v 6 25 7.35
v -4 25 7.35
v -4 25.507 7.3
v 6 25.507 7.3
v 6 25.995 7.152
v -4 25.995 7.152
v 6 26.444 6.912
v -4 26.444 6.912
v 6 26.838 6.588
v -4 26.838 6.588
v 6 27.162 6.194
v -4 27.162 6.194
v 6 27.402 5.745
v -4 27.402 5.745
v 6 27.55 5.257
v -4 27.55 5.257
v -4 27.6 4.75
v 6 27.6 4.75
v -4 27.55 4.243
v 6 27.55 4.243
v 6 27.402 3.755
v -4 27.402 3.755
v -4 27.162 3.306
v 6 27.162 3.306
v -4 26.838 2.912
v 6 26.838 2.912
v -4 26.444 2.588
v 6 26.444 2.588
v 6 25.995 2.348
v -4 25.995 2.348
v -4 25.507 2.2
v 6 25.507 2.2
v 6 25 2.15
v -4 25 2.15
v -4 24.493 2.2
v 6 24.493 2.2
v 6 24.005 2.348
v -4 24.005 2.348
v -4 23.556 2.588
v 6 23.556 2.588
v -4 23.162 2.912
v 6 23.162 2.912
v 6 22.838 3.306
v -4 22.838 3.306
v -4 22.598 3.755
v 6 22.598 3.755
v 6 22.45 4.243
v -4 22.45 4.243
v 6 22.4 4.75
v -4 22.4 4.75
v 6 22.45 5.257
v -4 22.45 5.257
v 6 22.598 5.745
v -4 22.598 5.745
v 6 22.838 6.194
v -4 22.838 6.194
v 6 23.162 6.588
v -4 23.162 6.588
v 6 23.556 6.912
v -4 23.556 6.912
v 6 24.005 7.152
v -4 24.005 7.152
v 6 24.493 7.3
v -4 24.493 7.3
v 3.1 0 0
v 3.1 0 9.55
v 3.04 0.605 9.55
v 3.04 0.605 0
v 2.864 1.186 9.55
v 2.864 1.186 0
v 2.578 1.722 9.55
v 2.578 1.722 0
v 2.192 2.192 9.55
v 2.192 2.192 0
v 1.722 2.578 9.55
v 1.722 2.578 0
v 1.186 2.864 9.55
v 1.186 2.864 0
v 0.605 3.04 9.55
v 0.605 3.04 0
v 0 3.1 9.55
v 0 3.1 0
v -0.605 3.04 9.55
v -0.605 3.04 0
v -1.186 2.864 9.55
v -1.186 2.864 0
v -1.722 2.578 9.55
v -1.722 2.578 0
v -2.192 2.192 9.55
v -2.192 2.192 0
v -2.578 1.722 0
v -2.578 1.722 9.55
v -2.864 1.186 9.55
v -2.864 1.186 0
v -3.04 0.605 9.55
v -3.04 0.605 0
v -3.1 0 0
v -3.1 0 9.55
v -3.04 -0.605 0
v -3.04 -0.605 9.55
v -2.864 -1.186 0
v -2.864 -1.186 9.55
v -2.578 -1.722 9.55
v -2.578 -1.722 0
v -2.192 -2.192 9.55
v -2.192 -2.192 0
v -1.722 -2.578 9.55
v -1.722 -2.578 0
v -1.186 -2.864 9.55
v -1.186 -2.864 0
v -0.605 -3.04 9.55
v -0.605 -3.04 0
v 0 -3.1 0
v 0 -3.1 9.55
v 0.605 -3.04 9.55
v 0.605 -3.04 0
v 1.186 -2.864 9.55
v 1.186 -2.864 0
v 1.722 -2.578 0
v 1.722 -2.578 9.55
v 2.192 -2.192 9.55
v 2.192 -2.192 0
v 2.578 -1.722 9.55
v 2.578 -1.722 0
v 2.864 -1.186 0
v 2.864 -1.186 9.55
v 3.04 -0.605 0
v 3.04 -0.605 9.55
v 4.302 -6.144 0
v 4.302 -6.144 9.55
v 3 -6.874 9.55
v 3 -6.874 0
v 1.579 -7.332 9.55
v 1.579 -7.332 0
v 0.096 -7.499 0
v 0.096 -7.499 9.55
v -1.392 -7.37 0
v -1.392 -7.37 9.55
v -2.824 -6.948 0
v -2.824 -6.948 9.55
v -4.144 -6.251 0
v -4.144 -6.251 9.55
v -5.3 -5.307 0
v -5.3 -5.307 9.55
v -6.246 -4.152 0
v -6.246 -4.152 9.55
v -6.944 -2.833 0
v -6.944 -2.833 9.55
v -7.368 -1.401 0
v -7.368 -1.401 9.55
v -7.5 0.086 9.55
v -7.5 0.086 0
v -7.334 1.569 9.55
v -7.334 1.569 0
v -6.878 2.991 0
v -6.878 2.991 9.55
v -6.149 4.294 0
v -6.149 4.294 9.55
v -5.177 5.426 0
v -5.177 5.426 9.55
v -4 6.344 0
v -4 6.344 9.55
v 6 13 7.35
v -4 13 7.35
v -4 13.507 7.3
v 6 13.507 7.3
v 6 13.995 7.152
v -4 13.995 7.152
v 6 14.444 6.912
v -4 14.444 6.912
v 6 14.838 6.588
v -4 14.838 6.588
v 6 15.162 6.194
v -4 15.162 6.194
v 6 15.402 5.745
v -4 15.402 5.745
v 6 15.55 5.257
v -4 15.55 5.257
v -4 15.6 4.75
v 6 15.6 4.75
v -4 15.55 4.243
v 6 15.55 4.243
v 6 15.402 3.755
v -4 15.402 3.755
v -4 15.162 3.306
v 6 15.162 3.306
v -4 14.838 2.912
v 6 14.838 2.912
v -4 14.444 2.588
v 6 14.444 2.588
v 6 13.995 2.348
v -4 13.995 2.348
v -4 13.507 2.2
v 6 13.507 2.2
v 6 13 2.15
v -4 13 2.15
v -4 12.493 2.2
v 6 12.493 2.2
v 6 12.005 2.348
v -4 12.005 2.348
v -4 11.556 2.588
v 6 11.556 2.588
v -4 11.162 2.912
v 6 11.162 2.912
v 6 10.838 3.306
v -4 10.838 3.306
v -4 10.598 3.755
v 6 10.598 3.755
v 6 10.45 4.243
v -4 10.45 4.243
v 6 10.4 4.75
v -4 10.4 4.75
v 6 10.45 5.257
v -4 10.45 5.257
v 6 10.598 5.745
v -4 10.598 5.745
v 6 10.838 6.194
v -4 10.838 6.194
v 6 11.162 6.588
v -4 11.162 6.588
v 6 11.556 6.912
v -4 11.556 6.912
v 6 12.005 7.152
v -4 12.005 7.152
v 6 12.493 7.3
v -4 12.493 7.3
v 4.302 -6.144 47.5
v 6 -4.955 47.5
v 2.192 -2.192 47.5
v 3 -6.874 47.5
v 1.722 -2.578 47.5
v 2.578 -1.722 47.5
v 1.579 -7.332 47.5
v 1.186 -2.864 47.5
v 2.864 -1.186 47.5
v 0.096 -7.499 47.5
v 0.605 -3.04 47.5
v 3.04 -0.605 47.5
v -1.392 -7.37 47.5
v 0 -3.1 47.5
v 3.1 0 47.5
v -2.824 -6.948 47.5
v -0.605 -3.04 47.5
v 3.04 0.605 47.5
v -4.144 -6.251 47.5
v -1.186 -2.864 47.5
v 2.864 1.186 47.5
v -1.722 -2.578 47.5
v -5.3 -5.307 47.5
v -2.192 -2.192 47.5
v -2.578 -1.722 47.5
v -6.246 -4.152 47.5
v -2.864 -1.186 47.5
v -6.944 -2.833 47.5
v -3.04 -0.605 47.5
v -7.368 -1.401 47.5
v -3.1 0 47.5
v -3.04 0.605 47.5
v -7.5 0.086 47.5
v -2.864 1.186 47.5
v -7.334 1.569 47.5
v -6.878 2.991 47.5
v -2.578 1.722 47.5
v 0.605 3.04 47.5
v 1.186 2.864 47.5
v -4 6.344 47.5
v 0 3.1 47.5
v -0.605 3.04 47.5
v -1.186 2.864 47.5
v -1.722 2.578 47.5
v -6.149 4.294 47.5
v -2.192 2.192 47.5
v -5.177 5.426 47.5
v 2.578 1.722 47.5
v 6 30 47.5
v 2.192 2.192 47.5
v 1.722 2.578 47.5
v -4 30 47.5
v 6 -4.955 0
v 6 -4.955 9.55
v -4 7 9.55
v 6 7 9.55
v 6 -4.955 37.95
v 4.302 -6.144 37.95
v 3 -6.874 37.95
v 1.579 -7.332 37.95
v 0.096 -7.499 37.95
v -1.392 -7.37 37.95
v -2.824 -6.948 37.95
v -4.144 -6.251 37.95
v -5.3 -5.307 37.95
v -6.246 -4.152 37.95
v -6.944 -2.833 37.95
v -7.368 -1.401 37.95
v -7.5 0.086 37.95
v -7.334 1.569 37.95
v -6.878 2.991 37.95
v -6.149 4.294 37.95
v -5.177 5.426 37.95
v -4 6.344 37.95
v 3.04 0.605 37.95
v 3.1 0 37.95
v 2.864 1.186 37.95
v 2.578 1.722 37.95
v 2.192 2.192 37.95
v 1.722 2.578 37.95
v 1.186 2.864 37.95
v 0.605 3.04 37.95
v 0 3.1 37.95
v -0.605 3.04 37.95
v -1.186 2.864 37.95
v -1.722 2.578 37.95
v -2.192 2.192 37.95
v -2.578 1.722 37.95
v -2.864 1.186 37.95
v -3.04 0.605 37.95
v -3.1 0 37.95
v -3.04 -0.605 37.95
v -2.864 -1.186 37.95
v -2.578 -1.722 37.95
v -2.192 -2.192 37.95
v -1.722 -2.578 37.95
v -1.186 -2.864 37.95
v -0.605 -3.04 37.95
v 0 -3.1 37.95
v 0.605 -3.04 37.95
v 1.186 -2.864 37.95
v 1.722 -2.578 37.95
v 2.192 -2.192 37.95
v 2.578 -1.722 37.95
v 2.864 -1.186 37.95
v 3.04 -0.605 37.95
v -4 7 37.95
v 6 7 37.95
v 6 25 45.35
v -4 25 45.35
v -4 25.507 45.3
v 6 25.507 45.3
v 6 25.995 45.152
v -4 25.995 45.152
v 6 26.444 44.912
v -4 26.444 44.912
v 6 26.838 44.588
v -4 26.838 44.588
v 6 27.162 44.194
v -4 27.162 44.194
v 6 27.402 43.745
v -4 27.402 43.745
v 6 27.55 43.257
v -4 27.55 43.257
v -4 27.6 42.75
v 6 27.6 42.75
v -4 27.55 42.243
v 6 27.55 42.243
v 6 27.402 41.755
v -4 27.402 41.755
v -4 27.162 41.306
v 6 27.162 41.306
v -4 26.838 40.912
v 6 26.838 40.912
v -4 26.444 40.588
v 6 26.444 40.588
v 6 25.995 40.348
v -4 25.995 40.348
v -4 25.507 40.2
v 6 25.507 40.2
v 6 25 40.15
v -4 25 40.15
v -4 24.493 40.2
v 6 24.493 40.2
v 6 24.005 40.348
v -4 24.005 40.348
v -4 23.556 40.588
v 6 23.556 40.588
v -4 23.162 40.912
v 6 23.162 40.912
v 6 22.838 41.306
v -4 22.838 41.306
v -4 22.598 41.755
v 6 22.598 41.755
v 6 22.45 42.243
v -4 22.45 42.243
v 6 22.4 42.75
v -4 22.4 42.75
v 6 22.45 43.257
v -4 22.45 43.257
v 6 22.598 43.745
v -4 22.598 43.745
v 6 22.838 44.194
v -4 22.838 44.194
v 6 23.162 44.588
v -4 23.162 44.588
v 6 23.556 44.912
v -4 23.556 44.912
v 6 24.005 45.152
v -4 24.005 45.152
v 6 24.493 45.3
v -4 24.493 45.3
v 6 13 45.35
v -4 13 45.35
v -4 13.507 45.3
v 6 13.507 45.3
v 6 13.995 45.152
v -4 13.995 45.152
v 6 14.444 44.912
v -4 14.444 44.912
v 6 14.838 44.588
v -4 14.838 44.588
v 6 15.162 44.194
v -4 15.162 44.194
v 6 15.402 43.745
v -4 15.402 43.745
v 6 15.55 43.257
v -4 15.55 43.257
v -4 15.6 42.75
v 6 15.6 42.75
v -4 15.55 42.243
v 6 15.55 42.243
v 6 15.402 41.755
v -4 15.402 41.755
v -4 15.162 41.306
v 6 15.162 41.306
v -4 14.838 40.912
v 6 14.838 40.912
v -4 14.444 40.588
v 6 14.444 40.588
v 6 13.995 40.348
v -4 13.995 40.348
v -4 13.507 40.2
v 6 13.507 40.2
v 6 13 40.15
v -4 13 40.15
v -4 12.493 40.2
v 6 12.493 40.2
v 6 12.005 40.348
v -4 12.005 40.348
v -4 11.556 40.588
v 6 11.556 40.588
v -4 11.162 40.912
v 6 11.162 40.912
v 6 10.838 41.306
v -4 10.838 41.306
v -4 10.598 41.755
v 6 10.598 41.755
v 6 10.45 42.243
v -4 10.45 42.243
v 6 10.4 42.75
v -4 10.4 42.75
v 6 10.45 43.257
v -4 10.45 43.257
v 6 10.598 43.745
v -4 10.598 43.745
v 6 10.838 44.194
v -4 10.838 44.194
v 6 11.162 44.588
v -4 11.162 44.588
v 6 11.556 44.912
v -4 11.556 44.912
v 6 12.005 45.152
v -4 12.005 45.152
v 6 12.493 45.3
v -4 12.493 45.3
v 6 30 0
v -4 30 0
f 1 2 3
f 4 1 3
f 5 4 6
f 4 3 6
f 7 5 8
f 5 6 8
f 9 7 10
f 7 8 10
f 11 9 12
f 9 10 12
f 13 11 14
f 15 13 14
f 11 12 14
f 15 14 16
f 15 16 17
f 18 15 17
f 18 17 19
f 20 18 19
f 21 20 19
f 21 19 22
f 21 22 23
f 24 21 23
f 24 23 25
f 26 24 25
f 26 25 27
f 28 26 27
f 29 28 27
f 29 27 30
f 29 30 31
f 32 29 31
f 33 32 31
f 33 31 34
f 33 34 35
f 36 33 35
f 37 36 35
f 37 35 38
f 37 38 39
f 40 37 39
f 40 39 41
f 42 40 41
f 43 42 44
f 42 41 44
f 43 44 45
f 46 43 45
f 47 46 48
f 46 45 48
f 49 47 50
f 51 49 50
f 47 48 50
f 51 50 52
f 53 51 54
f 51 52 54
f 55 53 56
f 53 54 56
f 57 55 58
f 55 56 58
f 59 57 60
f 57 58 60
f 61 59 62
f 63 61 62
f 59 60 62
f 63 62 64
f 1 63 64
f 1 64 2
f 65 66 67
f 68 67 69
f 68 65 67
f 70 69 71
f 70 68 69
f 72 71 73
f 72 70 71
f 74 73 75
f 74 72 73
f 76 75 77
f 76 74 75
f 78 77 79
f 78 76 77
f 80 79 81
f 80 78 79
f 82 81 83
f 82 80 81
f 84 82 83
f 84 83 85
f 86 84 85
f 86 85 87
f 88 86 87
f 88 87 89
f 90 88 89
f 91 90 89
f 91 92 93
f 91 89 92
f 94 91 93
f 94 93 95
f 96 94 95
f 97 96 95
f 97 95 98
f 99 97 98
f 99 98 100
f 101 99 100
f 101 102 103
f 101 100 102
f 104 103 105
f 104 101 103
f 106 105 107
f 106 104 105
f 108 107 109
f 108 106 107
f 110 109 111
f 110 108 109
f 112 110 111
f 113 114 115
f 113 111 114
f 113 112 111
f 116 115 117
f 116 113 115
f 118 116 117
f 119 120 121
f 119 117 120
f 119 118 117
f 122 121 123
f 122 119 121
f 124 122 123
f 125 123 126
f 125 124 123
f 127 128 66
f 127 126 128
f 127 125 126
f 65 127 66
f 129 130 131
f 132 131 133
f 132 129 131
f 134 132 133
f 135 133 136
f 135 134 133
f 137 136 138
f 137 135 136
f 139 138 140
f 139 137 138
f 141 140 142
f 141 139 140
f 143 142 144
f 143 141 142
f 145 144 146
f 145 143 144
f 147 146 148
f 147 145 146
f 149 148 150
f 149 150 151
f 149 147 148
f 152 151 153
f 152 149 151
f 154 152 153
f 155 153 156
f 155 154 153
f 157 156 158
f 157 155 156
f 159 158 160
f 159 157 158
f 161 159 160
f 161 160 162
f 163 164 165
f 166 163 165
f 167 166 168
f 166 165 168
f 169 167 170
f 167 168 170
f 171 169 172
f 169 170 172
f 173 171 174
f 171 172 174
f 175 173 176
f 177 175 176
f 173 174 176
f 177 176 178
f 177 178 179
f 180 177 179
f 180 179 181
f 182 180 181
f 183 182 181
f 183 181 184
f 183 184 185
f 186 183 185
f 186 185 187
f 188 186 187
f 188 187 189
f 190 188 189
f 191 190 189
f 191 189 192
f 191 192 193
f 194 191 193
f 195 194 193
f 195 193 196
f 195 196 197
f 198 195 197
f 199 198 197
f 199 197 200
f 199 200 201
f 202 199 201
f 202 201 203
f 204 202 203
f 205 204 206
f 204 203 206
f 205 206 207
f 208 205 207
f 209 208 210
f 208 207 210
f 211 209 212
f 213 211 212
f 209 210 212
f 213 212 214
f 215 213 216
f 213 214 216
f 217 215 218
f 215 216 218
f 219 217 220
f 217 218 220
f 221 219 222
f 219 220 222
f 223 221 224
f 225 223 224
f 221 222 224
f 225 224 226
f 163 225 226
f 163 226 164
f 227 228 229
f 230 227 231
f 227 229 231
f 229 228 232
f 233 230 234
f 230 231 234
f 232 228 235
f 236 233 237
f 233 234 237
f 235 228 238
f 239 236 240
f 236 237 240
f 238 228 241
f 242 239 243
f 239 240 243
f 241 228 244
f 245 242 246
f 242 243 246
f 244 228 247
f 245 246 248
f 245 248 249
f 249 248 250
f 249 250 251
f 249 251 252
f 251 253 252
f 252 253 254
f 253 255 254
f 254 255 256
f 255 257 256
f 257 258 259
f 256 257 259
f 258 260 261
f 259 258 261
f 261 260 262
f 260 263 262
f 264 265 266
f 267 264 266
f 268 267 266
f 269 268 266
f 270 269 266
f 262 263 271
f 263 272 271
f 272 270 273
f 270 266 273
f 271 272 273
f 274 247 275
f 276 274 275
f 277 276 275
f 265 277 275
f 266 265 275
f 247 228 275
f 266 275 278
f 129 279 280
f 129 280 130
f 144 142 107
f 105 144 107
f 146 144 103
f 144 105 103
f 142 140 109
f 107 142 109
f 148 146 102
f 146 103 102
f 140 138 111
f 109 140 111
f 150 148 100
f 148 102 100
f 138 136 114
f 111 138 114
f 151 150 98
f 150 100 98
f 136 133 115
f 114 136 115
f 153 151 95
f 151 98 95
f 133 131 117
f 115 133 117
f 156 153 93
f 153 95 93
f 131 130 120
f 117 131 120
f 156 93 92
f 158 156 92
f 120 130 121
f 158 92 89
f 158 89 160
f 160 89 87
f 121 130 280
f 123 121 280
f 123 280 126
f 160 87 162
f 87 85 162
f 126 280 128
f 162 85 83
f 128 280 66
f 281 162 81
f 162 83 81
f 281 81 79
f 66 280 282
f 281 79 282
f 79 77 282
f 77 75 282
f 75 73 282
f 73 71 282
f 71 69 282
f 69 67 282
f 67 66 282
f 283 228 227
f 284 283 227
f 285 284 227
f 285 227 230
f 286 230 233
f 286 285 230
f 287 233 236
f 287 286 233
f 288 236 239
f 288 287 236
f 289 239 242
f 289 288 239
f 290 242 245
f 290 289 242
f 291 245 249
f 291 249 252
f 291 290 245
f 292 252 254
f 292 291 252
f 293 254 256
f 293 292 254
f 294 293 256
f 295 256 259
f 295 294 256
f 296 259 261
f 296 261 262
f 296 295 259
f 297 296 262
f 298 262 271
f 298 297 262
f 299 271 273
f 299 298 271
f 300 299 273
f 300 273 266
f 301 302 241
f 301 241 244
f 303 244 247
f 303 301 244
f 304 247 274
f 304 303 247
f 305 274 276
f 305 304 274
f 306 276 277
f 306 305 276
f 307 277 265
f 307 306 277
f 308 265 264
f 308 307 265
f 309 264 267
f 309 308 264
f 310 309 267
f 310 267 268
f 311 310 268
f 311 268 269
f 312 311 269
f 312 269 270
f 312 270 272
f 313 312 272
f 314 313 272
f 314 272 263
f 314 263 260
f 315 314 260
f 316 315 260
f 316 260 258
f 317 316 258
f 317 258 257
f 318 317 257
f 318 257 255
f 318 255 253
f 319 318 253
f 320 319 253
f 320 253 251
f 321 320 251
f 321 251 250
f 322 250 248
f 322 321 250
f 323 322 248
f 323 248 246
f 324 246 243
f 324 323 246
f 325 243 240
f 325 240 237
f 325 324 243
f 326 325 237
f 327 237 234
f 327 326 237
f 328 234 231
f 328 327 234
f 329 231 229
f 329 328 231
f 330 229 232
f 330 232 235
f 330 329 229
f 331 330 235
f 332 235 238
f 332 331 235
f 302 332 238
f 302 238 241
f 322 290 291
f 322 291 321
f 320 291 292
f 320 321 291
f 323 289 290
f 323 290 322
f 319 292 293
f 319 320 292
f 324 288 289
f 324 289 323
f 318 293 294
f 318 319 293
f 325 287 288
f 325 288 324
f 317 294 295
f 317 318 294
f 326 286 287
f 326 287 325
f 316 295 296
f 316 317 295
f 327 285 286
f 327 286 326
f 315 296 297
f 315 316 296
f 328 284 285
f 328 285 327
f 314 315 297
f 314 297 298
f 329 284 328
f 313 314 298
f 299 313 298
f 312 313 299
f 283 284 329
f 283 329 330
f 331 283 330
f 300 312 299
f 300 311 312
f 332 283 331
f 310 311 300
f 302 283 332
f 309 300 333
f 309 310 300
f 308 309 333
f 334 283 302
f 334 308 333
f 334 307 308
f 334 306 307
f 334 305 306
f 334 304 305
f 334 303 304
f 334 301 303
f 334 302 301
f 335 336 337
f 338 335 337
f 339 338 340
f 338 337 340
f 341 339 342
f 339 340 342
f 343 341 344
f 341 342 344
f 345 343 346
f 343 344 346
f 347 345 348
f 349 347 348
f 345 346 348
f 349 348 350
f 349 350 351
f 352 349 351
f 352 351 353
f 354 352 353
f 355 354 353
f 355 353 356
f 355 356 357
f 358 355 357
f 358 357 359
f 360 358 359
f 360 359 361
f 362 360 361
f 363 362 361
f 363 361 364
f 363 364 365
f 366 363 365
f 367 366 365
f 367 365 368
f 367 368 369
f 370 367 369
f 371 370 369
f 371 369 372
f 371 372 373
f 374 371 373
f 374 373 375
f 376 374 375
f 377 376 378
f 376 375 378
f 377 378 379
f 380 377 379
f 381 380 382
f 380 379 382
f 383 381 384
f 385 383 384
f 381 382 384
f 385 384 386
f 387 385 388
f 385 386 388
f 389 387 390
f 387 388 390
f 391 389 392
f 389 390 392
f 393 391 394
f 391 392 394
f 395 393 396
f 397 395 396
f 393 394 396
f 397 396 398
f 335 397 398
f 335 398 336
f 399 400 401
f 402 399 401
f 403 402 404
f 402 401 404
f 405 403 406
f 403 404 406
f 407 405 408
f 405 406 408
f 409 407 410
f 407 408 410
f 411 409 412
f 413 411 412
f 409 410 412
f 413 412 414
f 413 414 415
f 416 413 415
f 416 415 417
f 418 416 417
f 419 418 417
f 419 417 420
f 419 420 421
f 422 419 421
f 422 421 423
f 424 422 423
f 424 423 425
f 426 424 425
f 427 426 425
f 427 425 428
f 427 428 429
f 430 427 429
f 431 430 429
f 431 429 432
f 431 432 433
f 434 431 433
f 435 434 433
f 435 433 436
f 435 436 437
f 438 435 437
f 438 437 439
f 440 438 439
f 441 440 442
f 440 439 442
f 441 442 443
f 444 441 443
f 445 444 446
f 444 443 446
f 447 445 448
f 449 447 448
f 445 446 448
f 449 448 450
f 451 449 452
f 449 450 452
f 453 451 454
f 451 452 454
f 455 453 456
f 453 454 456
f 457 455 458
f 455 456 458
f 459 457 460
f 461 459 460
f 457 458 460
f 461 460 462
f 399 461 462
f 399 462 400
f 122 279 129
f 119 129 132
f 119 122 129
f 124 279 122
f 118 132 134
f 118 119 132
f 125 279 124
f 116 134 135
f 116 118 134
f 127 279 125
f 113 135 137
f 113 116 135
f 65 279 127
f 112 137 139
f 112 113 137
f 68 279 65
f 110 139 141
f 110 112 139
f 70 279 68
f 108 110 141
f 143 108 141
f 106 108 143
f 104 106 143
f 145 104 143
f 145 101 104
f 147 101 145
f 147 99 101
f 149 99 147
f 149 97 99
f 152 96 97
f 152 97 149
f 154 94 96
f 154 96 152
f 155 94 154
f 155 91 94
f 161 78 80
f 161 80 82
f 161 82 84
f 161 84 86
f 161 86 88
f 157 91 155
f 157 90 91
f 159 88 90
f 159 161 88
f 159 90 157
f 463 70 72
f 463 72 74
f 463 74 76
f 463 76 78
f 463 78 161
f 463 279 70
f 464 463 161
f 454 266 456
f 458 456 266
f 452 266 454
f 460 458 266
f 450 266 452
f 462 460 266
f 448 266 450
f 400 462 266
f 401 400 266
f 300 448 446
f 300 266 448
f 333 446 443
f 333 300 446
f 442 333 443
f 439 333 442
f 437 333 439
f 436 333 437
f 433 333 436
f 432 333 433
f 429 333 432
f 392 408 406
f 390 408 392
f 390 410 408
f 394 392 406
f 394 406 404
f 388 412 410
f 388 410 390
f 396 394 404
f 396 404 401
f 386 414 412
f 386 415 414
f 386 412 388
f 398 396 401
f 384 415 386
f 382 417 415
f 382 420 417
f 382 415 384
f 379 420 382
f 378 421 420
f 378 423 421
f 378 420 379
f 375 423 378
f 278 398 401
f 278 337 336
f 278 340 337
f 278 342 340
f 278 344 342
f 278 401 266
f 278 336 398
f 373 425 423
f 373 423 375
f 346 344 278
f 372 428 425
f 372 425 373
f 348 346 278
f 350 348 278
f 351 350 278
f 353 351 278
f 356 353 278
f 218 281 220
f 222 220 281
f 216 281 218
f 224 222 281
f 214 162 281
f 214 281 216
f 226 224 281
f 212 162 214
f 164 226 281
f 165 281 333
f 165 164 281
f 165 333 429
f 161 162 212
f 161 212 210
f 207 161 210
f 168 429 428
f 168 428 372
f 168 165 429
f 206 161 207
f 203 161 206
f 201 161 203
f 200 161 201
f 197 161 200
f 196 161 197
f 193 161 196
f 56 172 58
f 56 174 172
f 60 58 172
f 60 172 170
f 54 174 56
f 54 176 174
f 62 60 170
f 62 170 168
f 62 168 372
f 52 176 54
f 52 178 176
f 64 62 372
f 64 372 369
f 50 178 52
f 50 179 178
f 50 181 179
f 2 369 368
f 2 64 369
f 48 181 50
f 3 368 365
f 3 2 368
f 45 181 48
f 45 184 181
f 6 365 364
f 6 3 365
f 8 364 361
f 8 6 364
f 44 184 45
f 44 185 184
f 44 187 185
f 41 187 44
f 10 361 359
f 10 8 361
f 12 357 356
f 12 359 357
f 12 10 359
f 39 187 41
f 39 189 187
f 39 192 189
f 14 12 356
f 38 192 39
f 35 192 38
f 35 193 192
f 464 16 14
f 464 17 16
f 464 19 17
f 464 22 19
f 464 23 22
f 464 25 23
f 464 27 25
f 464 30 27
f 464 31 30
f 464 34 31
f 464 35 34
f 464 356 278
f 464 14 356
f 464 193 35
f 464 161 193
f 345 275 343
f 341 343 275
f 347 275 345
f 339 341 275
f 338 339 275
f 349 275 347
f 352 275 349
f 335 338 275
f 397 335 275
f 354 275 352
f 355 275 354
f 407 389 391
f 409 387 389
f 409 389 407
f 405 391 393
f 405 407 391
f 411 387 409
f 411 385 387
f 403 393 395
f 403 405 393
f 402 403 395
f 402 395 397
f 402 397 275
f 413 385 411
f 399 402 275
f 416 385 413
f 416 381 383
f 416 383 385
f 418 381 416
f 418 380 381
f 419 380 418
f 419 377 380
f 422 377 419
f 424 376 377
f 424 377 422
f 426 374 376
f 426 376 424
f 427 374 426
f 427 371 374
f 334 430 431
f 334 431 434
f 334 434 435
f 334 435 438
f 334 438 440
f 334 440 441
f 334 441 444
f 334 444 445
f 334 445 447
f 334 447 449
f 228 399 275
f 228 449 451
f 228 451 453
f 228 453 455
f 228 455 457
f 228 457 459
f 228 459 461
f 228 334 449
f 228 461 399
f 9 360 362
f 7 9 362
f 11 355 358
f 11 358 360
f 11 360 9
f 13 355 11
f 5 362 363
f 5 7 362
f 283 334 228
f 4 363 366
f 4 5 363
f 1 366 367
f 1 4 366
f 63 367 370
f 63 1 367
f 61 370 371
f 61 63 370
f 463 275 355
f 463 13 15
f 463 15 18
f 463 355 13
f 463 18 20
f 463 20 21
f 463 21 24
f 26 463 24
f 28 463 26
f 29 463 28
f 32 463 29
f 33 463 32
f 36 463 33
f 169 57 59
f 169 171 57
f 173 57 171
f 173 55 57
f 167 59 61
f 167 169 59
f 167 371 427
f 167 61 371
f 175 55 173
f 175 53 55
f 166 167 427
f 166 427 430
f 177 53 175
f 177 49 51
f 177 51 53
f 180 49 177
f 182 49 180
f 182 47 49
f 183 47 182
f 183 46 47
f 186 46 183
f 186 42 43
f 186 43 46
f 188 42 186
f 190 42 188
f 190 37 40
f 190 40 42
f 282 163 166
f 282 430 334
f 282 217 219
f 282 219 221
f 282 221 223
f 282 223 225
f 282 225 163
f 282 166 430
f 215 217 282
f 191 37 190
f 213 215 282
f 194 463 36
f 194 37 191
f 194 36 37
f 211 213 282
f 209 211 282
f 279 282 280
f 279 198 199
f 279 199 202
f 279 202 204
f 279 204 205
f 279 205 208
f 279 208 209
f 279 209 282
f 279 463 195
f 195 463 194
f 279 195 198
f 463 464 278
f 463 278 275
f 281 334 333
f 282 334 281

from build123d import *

# Parameters (mm, degrees)
SKETCH1_R           = 3.1
BOSS_EXTRUDE1_DEPTH = 47.5
SKETCH2_W           = 28.4
SKETCH2_H           = 18.032695685
CUT_EXTRUDE1_DEPTH  = 14.5
SKETCH3_R           = 2.6
CUT_EXTRUDE2_DEPTH  = 11


with BuildPart() as part:
    # Sketch1 → Boss-Extrude1 (new body)
    with BuildSketch(Plane.XY):
        with BuildLine():
            Line((-4, 6.34428877), (-4, 30))
            Line((-4, 30), (6, 30))
            Line((6, 30), (6, -4.954564186))
            Line((6, -4.954564186), (4.301823273, -6.143640332))
            ThreePointArc((4.301823273, -6.143640332), (-6.245787992, -4.152123837), (-4, 6.34428877))
        make_face()
        Circle(SKETCH1_R, mode=Mode.SUBTRACT)
    extrude(amount=BOSS_EXTRUDE1_DEPTH)

    # Sketch2 → Cut-Extrude1 (cut, through all)
    with BuildSketch(Plane(origin=(6, 0, 0), x_dir=(0, 0, -1), z_dir=(1, 0, 0))):
        with Locations((-23.75, -2.016347843)):
            Rectangle(SKETCH2_W, SKETCH2_H)
    extrude(amount=-CUT_EXTRUDE1_DEPTH, mode=Mode.SUBTRACT)

    # Sketch3 → Cut-Extrude2 (cut, through all)
    with BuildSketch(Plane.ZY.offset(4)):
        with Locations((4.75, 25)):
            Circle(SKETCH3_R)
        with Locations((4.75, 13)):
            Circle(SKETCH3_R)
        with Locations((42.75, 25)):
            Circle(SKETCH3_R)
        with Locations((42.75, 13)):
            Circle(SKETCH3_R)
    extrude(amount=-CUT_EXTRUDE2_DEPTH, mode=Mode.SUBTRACT)


solid = part.part
